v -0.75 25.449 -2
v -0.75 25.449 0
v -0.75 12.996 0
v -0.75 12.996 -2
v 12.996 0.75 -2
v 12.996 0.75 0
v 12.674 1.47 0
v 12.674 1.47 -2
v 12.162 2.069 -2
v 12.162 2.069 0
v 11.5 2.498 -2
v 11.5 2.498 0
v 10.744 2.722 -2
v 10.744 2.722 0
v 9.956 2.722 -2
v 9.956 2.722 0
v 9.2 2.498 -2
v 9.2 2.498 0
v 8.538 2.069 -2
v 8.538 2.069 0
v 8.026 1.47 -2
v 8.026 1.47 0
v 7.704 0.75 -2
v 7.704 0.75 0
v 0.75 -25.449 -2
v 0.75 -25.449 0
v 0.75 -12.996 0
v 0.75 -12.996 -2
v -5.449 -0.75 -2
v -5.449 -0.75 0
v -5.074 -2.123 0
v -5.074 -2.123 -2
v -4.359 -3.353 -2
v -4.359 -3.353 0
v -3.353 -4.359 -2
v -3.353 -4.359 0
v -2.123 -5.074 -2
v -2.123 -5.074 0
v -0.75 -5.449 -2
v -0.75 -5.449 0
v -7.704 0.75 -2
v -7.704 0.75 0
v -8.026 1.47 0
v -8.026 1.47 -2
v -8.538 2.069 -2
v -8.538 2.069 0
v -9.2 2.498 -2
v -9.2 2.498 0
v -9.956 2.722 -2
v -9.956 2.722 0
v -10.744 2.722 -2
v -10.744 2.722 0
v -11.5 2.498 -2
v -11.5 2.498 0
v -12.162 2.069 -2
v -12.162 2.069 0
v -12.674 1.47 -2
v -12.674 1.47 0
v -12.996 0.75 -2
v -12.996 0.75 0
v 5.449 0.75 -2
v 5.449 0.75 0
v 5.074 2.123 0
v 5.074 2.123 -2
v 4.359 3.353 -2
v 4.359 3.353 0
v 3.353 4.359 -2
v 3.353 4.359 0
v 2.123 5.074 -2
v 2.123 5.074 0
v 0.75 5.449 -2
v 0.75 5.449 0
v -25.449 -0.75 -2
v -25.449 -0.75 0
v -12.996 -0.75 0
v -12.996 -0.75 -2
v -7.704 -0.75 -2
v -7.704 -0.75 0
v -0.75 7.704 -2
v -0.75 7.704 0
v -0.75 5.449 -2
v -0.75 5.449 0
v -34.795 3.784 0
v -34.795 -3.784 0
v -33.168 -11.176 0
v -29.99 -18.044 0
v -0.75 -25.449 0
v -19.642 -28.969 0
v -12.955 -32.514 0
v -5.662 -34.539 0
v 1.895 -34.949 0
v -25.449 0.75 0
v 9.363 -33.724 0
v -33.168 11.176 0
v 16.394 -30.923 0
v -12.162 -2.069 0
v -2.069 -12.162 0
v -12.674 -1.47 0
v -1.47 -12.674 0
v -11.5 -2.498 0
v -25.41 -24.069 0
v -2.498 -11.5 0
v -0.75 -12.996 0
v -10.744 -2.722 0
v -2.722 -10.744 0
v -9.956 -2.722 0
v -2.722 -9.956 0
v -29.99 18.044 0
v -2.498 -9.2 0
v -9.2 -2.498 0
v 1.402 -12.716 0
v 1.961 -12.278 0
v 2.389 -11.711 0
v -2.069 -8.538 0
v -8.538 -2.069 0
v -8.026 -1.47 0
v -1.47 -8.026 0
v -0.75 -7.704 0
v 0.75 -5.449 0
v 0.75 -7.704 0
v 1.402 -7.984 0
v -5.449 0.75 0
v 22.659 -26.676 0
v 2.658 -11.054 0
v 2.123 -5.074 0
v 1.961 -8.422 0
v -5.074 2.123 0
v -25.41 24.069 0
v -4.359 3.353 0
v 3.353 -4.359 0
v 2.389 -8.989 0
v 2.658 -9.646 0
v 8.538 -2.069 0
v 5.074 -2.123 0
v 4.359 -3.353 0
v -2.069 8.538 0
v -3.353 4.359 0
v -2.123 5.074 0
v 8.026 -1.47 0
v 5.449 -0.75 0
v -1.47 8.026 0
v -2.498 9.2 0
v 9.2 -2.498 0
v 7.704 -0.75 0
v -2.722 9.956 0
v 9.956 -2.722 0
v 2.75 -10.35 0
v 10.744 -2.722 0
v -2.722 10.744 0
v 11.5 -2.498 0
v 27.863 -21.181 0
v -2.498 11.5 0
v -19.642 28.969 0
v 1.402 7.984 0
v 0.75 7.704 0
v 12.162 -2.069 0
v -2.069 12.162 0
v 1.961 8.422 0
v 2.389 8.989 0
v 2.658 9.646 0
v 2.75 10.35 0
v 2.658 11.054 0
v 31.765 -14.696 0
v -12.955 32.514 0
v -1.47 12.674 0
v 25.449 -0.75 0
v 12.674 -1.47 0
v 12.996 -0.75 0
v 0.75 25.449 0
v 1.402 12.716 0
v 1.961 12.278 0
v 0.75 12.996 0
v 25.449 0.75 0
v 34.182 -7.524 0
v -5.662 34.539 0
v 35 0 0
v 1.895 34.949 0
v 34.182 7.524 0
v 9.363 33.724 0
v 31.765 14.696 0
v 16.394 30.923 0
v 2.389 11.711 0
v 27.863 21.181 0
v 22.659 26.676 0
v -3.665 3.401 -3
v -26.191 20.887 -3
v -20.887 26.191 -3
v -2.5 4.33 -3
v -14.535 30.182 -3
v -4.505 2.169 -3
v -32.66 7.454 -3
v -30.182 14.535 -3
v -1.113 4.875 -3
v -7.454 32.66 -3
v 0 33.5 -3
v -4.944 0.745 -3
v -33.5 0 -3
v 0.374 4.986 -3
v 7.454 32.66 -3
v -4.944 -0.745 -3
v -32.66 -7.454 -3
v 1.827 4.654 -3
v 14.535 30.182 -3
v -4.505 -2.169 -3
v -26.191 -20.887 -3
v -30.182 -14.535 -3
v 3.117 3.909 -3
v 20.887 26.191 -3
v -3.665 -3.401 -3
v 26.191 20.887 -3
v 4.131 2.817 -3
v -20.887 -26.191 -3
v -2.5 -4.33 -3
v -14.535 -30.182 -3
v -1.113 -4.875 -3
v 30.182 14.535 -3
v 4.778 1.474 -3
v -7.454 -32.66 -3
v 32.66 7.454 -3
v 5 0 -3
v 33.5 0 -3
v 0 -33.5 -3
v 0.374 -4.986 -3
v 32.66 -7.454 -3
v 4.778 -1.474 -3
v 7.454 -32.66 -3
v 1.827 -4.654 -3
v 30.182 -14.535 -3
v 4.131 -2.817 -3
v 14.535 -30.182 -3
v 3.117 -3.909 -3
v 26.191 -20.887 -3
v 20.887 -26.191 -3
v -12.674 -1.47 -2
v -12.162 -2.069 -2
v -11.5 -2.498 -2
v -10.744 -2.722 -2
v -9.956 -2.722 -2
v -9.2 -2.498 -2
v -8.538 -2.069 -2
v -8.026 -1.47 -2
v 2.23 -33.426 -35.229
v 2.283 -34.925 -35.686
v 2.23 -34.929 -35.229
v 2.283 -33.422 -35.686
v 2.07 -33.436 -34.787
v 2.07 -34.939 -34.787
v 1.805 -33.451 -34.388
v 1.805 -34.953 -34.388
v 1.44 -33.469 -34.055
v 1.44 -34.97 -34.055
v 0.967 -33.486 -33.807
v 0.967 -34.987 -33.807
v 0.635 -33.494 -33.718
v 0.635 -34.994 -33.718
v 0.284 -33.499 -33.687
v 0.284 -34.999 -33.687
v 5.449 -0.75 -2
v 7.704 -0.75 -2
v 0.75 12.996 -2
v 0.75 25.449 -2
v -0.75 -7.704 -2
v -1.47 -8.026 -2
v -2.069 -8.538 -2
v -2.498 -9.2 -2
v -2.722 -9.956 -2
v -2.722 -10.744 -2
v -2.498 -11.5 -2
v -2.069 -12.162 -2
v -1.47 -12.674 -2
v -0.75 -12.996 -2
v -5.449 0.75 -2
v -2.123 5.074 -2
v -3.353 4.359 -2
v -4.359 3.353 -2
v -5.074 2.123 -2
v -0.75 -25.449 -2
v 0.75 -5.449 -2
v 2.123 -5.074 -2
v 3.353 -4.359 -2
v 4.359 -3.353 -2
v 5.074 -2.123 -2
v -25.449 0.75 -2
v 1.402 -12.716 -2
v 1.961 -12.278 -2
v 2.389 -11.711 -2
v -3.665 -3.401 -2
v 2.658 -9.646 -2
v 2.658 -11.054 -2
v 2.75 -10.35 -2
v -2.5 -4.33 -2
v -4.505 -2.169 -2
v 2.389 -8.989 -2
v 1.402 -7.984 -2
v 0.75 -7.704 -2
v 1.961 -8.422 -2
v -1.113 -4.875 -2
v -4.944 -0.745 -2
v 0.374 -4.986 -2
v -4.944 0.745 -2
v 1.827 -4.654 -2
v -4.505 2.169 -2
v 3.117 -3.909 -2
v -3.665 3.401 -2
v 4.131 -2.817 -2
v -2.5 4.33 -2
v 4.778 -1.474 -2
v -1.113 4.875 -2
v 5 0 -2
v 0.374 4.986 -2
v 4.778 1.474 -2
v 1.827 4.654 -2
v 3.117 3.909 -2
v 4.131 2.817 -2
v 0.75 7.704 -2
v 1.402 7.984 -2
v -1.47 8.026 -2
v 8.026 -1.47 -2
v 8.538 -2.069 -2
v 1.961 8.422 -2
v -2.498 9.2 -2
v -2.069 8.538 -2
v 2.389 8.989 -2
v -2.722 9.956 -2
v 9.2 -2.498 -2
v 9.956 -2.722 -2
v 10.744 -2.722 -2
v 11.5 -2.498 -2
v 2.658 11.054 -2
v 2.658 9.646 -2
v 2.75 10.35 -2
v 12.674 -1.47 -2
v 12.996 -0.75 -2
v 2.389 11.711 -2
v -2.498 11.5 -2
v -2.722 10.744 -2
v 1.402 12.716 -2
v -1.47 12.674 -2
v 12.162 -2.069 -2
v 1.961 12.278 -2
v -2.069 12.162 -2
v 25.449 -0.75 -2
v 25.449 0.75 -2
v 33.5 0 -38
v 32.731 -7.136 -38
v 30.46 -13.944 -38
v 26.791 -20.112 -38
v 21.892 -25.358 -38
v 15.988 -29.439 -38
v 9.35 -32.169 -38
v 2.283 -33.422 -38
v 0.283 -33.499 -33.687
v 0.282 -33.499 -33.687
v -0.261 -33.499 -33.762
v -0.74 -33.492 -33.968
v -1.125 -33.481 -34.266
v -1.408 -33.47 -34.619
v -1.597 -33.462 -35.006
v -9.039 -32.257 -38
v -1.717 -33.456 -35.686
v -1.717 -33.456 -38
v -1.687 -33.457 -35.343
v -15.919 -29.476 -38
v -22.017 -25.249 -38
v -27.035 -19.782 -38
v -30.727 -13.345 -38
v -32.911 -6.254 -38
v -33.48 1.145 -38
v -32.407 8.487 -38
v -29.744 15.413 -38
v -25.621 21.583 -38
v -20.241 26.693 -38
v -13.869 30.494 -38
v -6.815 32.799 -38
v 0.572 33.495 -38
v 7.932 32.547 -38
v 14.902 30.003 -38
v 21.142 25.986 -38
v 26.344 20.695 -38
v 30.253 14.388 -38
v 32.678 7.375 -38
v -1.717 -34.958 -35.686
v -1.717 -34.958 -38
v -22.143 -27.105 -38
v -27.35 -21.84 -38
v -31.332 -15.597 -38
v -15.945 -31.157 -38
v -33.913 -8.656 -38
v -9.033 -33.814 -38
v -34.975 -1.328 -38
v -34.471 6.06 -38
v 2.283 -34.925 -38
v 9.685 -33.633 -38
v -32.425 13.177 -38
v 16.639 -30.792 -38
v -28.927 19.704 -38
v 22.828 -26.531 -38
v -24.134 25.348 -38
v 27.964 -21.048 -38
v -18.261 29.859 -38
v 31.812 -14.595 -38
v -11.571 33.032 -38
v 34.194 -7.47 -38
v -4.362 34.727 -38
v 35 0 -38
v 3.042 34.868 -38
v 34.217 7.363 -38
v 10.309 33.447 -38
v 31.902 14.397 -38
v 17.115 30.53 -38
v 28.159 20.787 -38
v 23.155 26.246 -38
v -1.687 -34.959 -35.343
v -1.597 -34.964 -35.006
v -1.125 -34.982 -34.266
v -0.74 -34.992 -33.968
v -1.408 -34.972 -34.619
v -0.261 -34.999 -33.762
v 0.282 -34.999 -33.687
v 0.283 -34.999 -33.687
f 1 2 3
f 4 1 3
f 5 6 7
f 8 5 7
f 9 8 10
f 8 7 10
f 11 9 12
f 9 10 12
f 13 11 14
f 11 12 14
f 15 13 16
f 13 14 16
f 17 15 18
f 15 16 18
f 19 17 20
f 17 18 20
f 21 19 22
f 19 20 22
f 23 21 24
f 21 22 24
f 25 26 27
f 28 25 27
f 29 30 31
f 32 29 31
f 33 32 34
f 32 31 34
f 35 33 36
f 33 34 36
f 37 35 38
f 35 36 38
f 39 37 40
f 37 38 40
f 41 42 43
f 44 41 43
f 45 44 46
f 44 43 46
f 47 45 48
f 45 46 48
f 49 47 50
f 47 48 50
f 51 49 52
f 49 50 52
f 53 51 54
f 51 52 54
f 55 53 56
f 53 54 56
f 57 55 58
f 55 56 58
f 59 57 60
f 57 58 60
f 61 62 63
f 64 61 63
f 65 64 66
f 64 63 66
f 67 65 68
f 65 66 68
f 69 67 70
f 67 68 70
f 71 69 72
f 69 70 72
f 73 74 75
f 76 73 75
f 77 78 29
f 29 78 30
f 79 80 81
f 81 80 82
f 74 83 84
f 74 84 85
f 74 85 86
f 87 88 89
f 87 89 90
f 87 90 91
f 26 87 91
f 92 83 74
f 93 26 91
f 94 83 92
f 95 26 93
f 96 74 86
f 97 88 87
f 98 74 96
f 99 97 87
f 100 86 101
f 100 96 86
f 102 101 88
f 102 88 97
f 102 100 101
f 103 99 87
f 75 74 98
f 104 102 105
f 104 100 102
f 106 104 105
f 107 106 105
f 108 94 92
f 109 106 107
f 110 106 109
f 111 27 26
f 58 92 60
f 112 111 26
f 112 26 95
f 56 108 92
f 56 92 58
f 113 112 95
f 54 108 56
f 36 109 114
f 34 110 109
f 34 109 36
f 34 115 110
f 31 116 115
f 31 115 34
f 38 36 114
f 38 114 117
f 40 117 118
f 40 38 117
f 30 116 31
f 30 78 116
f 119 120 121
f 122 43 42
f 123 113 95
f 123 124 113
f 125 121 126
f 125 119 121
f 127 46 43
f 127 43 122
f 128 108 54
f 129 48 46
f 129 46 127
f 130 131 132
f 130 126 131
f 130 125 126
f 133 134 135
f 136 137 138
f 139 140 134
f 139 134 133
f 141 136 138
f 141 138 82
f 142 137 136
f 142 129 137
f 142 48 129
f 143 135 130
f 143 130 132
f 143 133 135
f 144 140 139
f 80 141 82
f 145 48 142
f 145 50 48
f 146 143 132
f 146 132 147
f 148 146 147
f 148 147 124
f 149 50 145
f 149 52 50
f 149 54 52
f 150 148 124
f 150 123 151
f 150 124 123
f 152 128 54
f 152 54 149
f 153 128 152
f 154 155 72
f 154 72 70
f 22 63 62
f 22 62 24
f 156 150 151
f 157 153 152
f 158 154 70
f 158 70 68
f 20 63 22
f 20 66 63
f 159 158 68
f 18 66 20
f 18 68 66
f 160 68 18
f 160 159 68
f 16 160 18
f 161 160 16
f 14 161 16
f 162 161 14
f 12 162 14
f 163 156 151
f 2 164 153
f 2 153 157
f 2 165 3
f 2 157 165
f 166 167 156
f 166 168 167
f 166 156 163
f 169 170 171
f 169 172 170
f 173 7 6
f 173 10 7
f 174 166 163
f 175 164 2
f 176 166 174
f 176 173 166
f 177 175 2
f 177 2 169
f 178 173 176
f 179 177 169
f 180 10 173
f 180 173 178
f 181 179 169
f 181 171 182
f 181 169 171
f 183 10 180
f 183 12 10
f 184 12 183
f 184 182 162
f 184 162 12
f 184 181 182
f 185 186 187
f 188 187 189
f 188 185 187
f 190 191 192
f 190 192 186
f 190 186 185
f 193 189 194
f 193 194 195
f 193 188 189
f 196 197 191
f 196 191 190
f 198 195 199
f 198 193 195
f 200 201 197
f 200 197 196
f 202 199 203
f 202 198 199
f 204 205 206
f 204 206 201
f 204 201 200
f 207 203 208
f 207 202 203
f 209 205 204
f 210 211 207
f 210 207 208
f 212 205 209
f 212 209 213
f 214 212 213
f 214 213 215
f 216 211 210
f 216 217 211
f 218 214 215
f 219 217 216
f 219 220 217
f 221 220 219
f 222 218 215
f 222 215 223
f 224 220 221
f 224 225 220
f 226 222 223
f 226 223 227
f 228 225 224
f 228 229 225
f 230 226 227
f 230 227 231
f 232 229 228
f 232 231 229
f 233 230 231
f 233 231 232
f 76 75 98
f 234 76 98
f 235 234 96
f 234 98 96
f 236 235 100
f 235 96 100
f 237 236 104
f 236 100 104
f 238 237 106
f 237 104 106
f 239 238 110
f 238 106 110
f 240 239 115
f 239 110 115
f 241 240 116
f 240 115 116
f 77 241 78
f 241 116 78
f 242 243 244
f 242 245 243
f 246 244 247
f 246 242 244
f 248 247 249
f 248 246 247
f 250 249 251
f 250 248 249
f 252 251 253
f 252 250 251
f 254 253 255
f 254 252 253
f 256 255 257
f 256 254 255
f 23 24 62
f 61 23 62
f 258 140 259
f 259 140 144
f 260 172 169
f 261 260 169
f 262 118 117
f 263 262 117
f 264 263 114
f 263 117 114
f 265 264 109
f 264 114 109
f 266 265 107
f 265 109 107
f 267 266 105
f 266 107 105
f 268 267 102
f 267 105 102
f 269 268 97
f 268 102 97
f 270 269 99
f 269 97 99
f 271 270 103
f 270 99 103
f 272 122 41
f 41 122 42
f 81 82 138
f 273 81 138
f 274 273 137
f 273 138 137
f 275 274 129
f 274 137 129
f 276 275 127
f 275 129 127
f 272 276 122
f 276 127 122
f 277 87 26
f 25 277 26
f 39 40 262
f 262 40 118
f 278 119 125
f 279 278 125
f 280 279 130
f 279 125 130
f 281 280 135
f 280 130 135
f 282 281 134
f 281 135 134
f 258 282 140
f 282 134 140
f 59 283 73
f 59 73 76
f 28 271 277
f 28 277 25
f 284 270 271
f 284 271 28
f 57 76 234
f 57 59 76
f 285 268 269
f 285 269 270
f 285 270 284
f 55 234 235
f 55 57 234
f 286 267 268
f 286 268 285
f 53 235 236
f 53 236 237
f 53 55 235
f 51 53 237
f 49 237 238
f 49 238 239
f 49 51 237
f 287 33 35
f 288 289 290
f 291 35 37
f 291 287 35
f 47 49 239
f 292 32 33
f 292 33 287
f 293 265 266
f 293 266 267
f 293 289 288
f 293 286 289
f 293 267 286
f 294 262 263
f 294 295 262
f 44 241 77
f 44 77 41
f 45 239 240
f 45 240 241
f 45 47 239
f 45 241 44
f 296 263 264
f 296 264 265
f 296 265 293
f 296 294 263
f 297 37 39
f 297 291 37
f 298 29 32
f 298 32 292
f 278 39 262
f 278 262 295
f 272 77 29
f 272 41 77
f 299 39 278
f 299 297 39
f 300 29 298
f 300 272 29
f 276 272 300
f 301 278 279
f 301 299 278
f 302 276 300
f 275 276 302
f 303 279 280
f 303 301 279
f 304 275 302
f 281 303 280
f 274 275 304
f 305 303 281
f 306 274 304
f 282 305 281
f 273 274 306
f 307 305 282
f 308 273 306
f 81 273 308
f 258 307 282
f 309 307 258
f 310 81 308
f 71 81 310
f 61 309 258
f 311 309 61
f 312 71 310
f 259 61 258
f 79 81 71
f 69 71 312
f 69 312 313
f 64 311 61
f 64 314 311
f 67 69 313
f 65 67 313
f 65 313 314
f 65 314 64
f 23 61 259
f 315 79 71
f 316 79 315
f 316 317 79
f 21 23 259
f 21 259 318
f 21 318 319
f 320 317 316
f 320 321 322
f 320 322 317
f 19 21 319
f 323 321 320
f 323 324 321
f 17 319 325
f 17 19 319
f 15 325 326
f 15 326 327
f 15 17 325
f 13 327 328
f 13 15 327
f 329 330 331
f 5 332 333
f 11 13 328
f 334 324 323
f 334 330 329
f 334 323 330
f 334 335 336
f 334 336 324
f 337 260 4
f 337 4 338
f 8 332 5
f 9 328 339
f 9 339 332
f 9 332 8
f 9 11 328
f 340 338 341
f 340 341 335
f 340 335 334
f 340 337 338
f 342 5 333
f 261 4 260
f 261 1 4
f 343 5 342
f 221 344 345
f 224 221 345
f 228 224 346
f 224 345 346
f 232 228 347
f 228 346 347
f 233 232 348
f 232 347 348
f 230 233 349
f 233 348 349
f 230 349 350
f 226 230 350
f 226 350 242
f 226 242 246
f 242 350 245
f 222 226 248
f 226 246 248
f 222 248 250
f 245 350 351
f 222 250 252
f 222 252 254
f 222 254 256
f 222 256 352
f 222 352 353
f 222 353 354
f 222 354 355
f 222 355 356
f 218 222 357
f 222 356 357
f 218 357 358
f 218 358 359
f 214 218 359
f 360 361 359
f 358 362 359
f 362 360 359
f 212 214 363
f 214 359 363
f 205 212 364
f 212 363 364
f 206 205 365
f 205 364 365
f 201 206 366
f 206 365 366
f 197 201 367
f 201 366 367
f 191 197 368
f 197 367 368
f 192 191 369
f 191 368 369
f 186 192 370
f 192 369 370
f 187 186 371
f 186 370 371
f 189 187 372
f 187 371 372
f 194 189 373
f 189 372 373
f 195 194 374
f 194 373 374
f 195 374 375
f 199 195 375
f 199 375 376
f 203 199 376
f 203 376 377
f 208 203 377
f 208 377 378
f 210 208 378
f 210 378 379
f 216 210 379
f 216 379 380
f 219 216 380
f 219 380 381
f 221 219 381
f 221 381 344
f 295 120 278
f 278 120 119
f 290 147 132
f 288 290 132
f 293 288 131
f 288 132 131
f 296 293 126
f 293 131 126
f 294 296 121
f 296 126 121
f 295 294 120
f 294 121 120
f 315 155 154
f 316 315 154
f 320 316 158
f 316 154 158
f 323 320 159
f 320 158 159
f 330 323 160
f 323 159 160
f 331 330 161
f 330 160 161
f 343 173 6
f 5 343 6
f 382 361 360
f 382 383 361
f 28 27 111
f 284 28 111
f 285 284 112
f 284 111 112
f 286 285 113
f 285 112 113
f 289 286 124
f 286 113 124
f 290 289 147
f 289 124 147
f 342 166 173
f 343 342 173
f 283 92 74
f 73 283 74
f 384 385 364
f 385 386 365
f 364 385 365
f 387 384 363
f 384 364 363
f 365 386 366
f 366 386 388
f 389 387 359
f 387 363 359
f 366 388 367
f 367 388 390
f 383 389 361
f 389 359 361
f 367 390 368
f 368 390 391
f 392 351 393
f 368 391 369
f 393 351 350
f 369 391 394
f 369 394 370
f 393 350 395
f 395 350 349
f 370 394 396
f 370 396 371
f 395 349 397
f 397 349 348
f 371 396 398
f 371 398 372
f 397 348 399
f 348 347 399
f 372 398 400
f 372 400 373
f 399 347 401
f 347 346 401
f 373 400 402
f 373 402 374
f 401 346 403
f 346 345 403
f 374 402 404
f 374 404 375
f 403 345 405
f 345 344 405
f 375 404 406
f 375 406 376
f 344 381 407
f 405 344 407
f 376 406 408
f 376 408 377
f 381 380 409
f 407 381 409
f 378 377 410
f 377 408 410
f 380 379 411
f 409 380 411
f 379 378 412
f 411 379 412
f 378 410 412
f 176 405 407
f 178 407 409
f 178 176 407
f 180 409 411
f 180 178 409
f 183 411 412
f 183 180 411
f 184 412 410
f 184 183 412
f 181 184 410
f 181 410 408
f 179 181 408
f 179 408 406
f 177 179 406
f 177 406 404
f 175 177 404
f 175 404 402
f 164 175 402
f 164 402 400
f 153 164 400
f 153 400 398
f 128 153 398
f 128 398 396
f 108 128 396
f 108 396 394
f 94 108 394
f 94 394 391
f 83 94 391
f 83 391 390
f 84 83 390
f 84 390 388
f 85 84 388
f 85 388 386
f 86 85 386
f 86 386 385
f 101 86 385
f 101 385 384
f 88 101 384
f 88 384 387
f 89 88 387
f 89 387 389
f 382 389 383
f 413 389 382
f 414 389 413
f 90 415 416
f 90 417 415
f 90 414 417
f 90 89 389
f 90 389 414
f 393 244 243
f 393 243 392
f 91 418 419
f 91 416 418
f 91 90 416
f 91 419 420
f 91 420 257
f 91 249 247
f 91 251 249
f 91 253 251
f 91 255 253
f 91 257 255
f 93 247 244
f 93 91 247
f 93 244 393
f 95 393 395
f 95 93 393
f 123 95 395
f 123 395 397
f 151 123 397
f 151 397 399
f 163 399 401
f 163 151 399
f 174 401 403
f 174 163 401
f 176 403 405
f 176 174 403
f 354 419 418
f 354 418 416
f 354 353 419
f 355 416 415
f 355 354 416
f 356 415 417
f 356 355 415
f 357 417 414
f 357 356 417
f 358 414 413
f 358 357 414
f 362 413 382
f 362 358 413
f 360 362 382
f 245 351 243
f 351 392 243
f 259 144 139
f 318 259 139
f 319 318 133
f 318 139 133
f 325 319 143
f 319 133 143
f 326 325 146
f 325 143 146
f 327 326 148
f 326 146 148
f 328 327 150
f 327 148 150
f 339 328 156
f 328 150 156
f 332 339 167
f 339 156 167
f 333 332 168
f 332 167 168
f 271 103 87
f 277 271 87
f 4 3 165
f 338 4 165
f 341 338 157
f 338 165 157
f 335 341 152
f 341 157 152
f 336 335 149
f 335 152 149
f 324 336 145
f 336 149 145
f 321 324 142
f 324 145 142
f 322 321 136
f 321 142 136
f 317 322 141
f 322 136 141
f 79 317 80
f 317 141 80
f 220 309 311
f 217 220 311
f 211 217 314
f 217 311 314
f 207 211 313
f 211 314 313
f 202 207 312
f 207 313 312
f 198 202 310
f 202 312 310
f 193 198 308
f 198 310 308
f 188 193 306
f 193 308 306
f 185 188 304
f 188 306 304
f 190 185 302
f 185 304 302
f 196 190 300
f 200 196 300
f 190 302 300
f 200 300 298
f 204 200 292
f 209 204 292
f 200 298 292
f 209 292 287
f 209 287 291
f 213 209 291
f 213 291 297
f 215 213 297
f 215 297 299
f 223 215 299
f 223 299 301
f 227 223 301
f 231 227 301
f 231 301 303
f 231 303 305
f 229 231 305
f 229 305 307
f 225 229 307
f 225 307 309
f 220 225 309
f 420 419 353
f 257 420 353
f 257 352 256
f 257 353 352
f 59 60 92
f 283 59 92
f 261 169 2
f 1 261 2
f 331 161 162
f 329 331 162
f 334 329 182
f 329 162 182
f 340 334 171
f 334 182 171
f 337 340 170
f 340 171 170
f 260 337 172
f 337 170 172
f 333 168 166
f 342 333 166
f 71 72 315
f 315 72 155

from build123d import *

# Parameters (mm, degrees)
F0_R     = 35
F0_R_2   = 5
F1_DEPTH = 38
F2_DEPTH = 2
F3_R     = 33.5
F4_DEPTH = 35
F5_DEPTH = 38.001
F7_W     = 4
F7_H     = 4.5
F8_DEPTH = 2
F9_R     = 1.999


# Not quite as in the source:
# - a fillet or chamfer is up to 0.001 mm smaller than in the source, because OpenCascade refuses the exact size


with BuildPart() as f1:
    # F0 (on Top) → F1 (new body)
    with BuildSketch(Plane.XY):
        Circle(F0_R)
        with BuildLine():
            ThreePointArc((0.75, 5.4486236794), (3.8890872965, 3.8890872965), (5.4486236794, 0.75))
            Line((5.4486236794, 0.75), (7.7042486889, 0.75))
            ThreePointArc((7.7042486889, 0.75), (10.35, 2.75), (12.9957513111, 0.75))
            Line((12.9957513111, 0.75), (25.4486236794, 0.75))
            Line((25.4486236794, 0.75), (25.4486236794, -0.75))
            Line((25.4486236794, -0.75), (12.9957513111, -0.75))
            ThreePointArc((12.9957513111, -0.75), (10.35, -2.75), (7.7042486889, -0.75))
            Line((7.7042486889, -0.75), (5.4486236794, -0.75))
            ThreePointArc((5.4486236794, -0.75), (3.8890872965, -3.8890872965), (0.75, -5.4486236794))
            Line((0.75, -5.4486236794), (0.75, -7.7042486889))
            ThreePointArc((0.75, -7.7042486889), (2.1937410968, -8.6916876048), (2.75, -10.35))
            ThreePointArc((2.75, -10.35), (2.1937410968, -12.0083123952), (0.75, -12.9957513111))
            Line((0.75, -12.9957513111), (0.75, -25.4486236794))
            Line((0.75, -25.4486236794), (-0.75, -25.4486236794))
            Line((-0.75, -25.4486236794), (-0.75, -12.9957513111))
            ThreePointArc((-0.75, -12.9957513111), (-2.75, -10.35), (-0.75, -7.7042486889))
            Line((-0.75, -7.7042486889), (-0.75, -5.4486236794))
            ThreePointArc((-0.75, -5.4486236794), (-3.8890872965, -3.8890872965), (-5.4486236794, -0.75))
            Line((-5.4486236794, -0.75), (-7.7042486889, -0.75))
            ThreePointArc((-7.7042486889, -0.75), (-10.35, -2.75), (-12.9957513111, -0.75))
            Line((-12.9957513111, -0.75), (-25.4486236794, -0.75))
            Line((-25.4486236794, -0.75), (-25.4486236794, 0.75))
            Line((-25.4486236794, 0.75), (-12.9957513111, 0.75))
            ThreePointArc((-12.9957513111, 0.75), (-10.35, 2.75), (-7.7042486889, 0.75))
            Line((-7.7042486889, 0.75), (-5.4486236794, 0.75))
            ThreePointArc((-5.4486236794, 0.75), (-3.8890872965, 3.8890872965), (-0.75, 5.4486236794))
            Line((-0.75, 5.4486236794), (-0.75, 7.7042486889))
            ThreePointArc((-0.75, 7.7042486889), (-2.75, 10.35), (-0.75, 12.9957513111))
            Line((-0.75, 12.9957513111), (-0.75, 25.4486236794))
            Line((-0.75, 25.4486236794), (0.75, 25.4486236794))
            Line((0.75, 25.4486236794), (0.75, 12.9957513111))
            ThreePointArc((0.75, 12.9957513111), (2.1937410968, 12.0083123952), (2.75, 10.35))
            ThreePointArc((2.75, 10.35), (2.1937410968, 8.6916876048), (0.75, 7.7042486889))
            Line((0.75, 7.7042486889), (0.75, 5.4486236794))
        make_face(mode=Mode.SUBTRACT)
        with BuildLine():
            Line((0.75, -12.9957513111), (0.75, -7.7042486889))
            ThreePointArc((0.75, -7.7042486889), (0, -7.6), (-0.75, -7.7042486889))
            Line((-0.75, -7.7042486889), (-0.75, -12.9957513111))
            ThreePointArc((-0.75, -12.9957513111), (0, -13.1), (0.75, -12.9957513111))
        make_face()
        with BuildLine():
            Line((12.9957513111, 0.75), (7.7042486889, 0.75))
            ThreePointArc((7.7042486889, 0.75), (7.6, 0), (7.7042486889, -0.75))
            Line((7.7042486889, -0.75), (12.9957513111, -0.75))
            ThreePointArc((12.9957513111, -0.75), (13.0738131457, -0.3786052658), (13.1, 0))
            ThreePointArc((13.1, 0), (13.0738131457, 0.3786052658), (12.9957513111, 0.75))
        make_face()
        with BuildLine():
            ThreePointArc((-5.4486236794, -0.75), (-5.5, 0), (-5.4486236794, 0.75))
            Line((-5.4486236794, 0.75), (-7.7042486889, 0.75))
            ThreePointArc((-7.7042486889, 0.75), (-7.6261868543, 0.3786052658), (-7.6, 0))
            ThreePointArc((-7.6, 0), (-7.6261868543, -0.3786052658), (-7.7042486889, -0.75))
            Line((-7.7042486889, -0.75), (-5.4486236794, -0.75))
        make_face()
        with BuildLine():
            Line((-12.9957513111, 0.75), (-7.7042486889, 0.75))
            ThreePointArc((-7.7042486889, 0.75), (-10.35, 2.75), (-12.9957513111, 0.75))
        make_face()
        with BuildLine():
            ThreePointArc((-0.75, 12.9957513111), (0, 13.1), (0.75, 12.9957513111))
            Line((0.75, 12.9957513111), (0.75, 25.4486236794))
            Line((0.75, 25.4486236794), (-0.75, 25.4486236794))
            Line((-0.75, 25.4486236794), (-0.75, 12.9957513111))
        make_face()
        with BuildLine():
            ThreePointArc((-12.9957513111, -0.75), (-10.35, -2.75), (-7.7042486889, -0.75))
            Line((-7.7042486889, -0.75), (-12.9957513111, -0.75))
        make_face()
        with BuildLine():
            ThreePointArc((-12.9957513111, -0.75), (-13.1, 0), (-12.9957513111, 0.75))
            Line((-12.9957513111, 0.75), (-25.4486236794, 0.75))
            Line((-25.4486236794, 0.75), (-25.4486236794, -0.75))
            Line((-25.4486236794, -0.75), (-12.9957513111, -0.75))
        make_face()
        with BuildLine():
            Line((-0.75, -12.9957513111), (-0.75, -7.7042486889))
            ThreePointArc((-0.75, -7.7042486889), (-2.75, -10.35), (-0.75, -12.9957513111))
        make_face()
        with BuildLine():
            Line((0.75, -25.4486236794), (0.75, -12.9957513111))
            ThreePointArc((0.75, -12.9957513111), (0, -13.1), (-0.75, -12.9957513111))
            Line((-0.75, -12.9957513111), (-0.75, -25.4486236794))
            Line((-0.75, -25.4486236794), (0.75, -25.4486236794))
        make_face()
        with BuildLine():
            ThreePointArc((2.75, -10.35), (2.1937410968, -8.6916876048), (0.75, -7.7042486889))
            Line((0.75, -7.7042486889), (0.75, -12.9957513111))
            ThreePointArc((0.75, -12.9957513111), (2.1937410968, -12.0083123952), (2.75, -10.35))
        make_face()
        with BuildLine():
            Line((12.9957513111, -0.75), (7.7042486889, -0.75))
            ThreePointArc((7.7042486889, -0.75), (10.35, -2.75), (12.9957513111, -0.75))
        make_face()
        with BuildLine():
            Line((25.4486236794, 0.75), (12.9957513111, 0.75))
            ThreePointArc((12.9957513111, 0.75), (13.0738131457, 0.3786052658), (13.1, 0))
            ThreePointArc((13.1, 0), (13.0738131457, -0.3786052658), (12.9957513111, -0.75))
            Line((12.9957513111, -0.75), (25.4486236794, -0.75))
            Line((25.4486236794, -0.75), (25.4486236794, 0.75))
        make_face()
        with BuildLine():
            ThreePointArc((5.4486236794, -0.75), (5.4871408874, -0.3758788124), (5.5, 0))
            ThreePointArc((5.5, 0), (5.4871408874, 0.3758788124), (5.4486236794, 0.75))
            ThreePointArc((5.4486236794, 0.75), (3.8890872965, 3.8890872965), (0.75, 5.4486236794))
            ThreePointArc((0.75, 5.4486236794), (0, 5.5), (-0.75, 5.4486236794))
            ThreePointArc((-0.75, 5.4486236794), (-3.8890872965, 3.8890872965), (-5.4486236794, 0.75))
            ThreePointArc((-5.4486236794, 0.75), (-5.5, 0), (-5.4486236794, -0.75))
            ThreePointArc((-5.4486236794, -0.75), (-3.8890872965, -3.8890872965), (-0.75, -5.4486236794))
            ThreePointArc((-0.75, -5.4486236794), (0, -5.5), (0.75, -5.4486236794))
            ThreePointArc((0.75, -5.4486236794), (3.8890872965, -3.8890872965), (5.4486236794, -0.75))
        make_face()
        Circle(F0_R_2, mode=Mode.SUBTRACT)
        with BuildLine():
            ThreePointArc((12.9957513111, 0.75), (10.35, 2.75), (7.7042486889, 0.75))
            Line((7.7042486889, 0.75), (12.9957513111, 0.75))
        make_face()
        with BuildLine():
            ThreePointArc((-0.75, 7.7042486889), (0, 7.6), (0.75, 7.7042486889))
            Line((0.75, 7.7042486889), (0.75, 12.9957513111))
            ThreePointArc((0.75, 12.9957513111), (0, 13.1), (-0.75, 12.9957513111))
            Line((-0.75, 12.9957513111), (-0.75, 7.7042486889))
        make_face()
        with BuildLine():
            ThreePointArc((5.4486236794, 0.75), (5.4871408874, 0.3758788124), (5.5, 0))
            ThreePointArc((5.5, 0), (5.4871408874, -0.3758788124), (5.4486236794, -0.75))
            Line((5.4486236794, -0.75), (7.7042486889, -0.75))
            ThreePointArc((7.7042486889, -0.75), (7.6, 0), (7.7042486889, 0.75))
            Line((7.7042486889, 0.75), (5.4486236794, 0.75))
        make_face()
        with BuildLine():
            Line((0.75, -7.7042486889), (0.75, -5.4486236794))
            ThreePointArc((0.75, -5.4486236794), (0, -5.5), (-0.75, -5.4486236794))
            Line((-0.75, -5.4486236794), (-0.75, -7.7042486889))
            ThreePointArc((-0.75, -7.7042486889), (0, -7.6), (0.75, -7.7042486889))
        make_face()
        with BuildLine():
            ThreePointArc((-0.75, 5.4486236794), (0, 5.5), (0.75, 5.4486236794))
            Line((0.75, 5.4486236794), (0.75, 7.7042486889))
            ThreePointArc((0.75, 7.7042486889), (0, 7.6), (-0.75, 7.7042486889))
            Line((-0.75, 7.7042486889), (-0.75, 5.4486236794))
        make_face()
        Circle(F0_R_2)
        with BuildLine():
            ThreePointArc((-0.75, 12.9957513111), (-2.75, 10.35), (-0.75, 7.7042486889))
            Line((-0.75, 7.7042486889), (-0.75, 12.9957513111))
        make_face()
        with BuildLine():
            Line((0.75, 12.9957513111), (0.75, 7.7042486889))
            ThreePointArc((0.75, 7.7042486889), (2.1937410968, 8.6916876048), (2.75, 10.35))
            ThreePointArc((2.75, 10.35), (2.1937410968, 12.0083123952), (0.75, 12.9957513111))
        make_face()
        with BuildLine():
            ThreePointArc((-7.6, 0), (-7.6261868543, 0.3786052658), (-7.7042486889, 0.75))
            Line((-7.7042486889, 0.75), (-12.9957513111, 0.75))
            ThreePointArc((-12.9957513111, 0.75), (-13.1, 0), (-12.9957513111, -0.75))
            Line((-12.9957513111, -0.75), (-7.7042486889, -0.75))
            ThreePointArc((-7.7042486889, -0.75), (-7.6261868543, -0.3786052658), (-7.6, 0))
        make_face()
    extrude(amount=-F1_DEPTH)

    # F0 (on Top) → F2 (cut)
    with BuildSketch(Plane.XY):
        with BuildLine():
            ThreePointArc((-12.9957513111, -0.75), (-10.35, -2.75), (-7.7042486889, -0.75))
            Line((-7.7042486889, -0.75), (-12.9957513111, -0.75))
        make_face()
        with BuildLine():
            Line((-12.9957513111, 0.75), (-7.7042486889, 0.75))
            ThreePointArc((-7.7042486889, 0.75), (-10.35, 2.75), (-12.9957513111, 0.75))
        make_face()
        with BuildLine():
            ThreePointArc((-7.6, 0), (-7.6261868543, 0.3786052658), (-7.7042486889, 0.75))
            Line((-7.7042486889, 0.75), (-12.9957513111, 0.75))
            ThreePointArc((-12.9957513111, 0.75), (-13.1, 0), (-12.9957513111, -0.75))
            Line((-12.9957513111, -0.75), (-7.7042486889, -0.75))
            ThreePointArc((-7.7042486889, -0.75), (-7.6261868543, -0.3786052658), (-7.6, 0))
        make_face()
        with BuildLine():
            ThreePointArc((-12.9957513111, -0.75), (-13.1, 0), (-12.9957513111, 0.75))
            Line((-12.9957513111, 0.75), (-25.4486236794, 0.75))
            Line((-25.4486236794, 0.75), (-25.4486236794, -0.75))
            Line((-25.4486236794, -0.75), (-12.9957513111, -0.75))
        make_face()
        with BuildLine():
            ThreePointArc((-5.4486236794, -0.75), (-5.5, 0), (-5.4486236794, 0.75))
            Line((-5.4486236794, 0.75), (-7.7042486889, 0.75))
            ThreePointArc((-7.7042486889, 0.75), (-7.6261868543, 0.3786052658), (-7.6, 0))
            ThreePointArc((-7.6, 0), (-7.6261868543, -0.3786052658), (-7.7042486889, -0.75))
            Line((-7.7042486889, -0.75), (-5.4486236794, -0.75))
        make_face()
        with BuildLine():
            ThreePointArc((5.4486236794, -0.75), (5.4871408874, -0.3758788124), (5.5, 0))
            ThreePointArc((5.5, 0), (5.4871408874, 0.3758788124), (5.4486236794, 0.75))
            ThreePointArc((5.4486236794, 0.75), (3.8890872965, 3.8890872965), (0.75, 5.4486236794))
            ThreePointArc((0.75, 5.4486236794), (0, 5.5), (-0.75, 5.4486236794))
            ThreePointArc((-0.75, 5.4486236794), (-3.8890872965, 3.8890872965), (-5.4486236794, 0.75))
            ThreePointArc((-5.4486236794, 0.75), (-5.5, 0), (-5.4486236794, -0.75))
            ThreePointArc((-5.4486236794, -0.75), (-3.8890872965, -3.8890872965), (-0.75, -5.4486236794))
            ThreePointArc((-0.75, -5.4486236794), (0, -5.5), (0.75, -5.4486236794))
            ThreePointArc((0.75, -5.4486236794), (3.8890872965, -3.8890872965), (5.4486236794, -0.75))
        make_face()
        Circle(F0_R_2, mode=Mode.SUBTRACT)
        with BuildLine():
            Line((0.75, 12.9957513111), (0.75, 7.7042486889))
            ThreePointArc((0.75, 7.7042486889), (2.1937410968, 8.6916876048), (2.75, 10.35))
            ThreePointArc((2.75, 10.35), (2.1937410968, 12.0083123952), (0.75, 12.9957513111))
        make_face()
        with BuildLine():
            ThreePointArc((-0.75, 12.9957513111), (-2.75, 10.35), (-0.75, 7.7042486889))
            Line((-0.75, 7.7042486889), (-0.75, 12.9957513111))
        make_face()
        with BuildLine():
            ThreePointArc((-0.75, 7.7042486889), (0, 7.6), (0.75, 7.7042486889))
            Line((0.75, 7.7042486889), (0.75, 12.9957513111))
            ThreePointArc((0.75, 12.9957513111), (0, 13.1), (-0.75, 12.9957513111))
            Line((-0.75, 12.9957513111), (-0.75, 7.7042486889))
        make_face()
        with BuildLine():
            ThreePointArc((-0.75, 5.4486236794), (0, 5.5), (0.75, 5.4486236794))
            Line((0.75, 5.4486236794), (0.75, 7.7042486889))
            ThreePointArc((0.75, 7.7042486889), (0, 7.6), (-0.75, 7.7042486889))
            Line((-0.75, 7.7042486889), (-0.75, 5.4486236794))
        make_face()
        with BuildLine():
            ThreePointArc((-0.75, 12.9957513111), (0, 13.1), (0.75, 12.9957513111))
            Line((0.75, 12.9957513111), (0.75, 25.4486236794))
            Line((0.75, 25.4486236794), (-0.75, 25.4486236794))
            Line((-0.75, 25.4486236794), (-0.75, 12.9957513111))
        make_face()
        with BuildLine():
            Line((12.9957513111, 0.75), (7.7042486889, 0.75))
            ThreePointArc((7.7042486889, 0.75), (7.6, 0), (7.7042486889, -0.75))
            Line((7.7042486889, -0.75), (12.9957513111, -0.75))
            ThreePointArc((12.9957513111, -0.75), (13.0738131457, -0.3786052658), (13.1, 0))
            ThreePointArc((13.1, 0), (13.0738131457, 0.3786052658), (12.9957513111, 0.75))
        make_face()
        with BuildLine():
            ThreePointArc((12.9957513111, 0.75), (10.35, 2.75), (7.7042486889, 0.75))
            Line((7.7042486889, 0.75), (12.9957513111, 0.75))
        make_face()
        with BuildLine():
            Line((12.9957513111, -0.75), (7.7042486889, -0.75))
            ThreePointArc((7.7042486889, -0.75), (10.35, -2.75), (12.9957513111, -0.75))
        make_face()
        with BuildLine():
            ThreePointArc((5.4486236794, 0.75), (5.4871408874, 0.3758788124), (5.5, 0))
            ThreePointArc((5.5, 0), (5.4871408874, -0.3758788124), (5.4486236794, -0.75))
            Line((5.4486236794, -0.75), (7.7042486889, -0.75))
            ThreePointArc((7.7042486889, -0.75), (7.6, 0), (7.7042486889, 0.75))
            Line((7.7042486889, 0.75), (5.4486236794, 0.75))
        make_face()
        with BuildLine():
            Line((25.4486236794, 0.75), (12.9957513111, 0.75))
            ThreePointArc((12.9957513111, 0.75), (13.0738131457, 0.3786052658), (13.1, 0))
            ThreePointArc((13.1, 0), (13.0738131457, -0.3786052658), (12.9957513111, -0.75))
            Line((12.9957513111, -0.75), (25.4486236794, -0.75))
            Line((25.4486236794, -0.75), (25.4486236794, 0.75))
        make_face()
        with BuildLine():
            Line((0.75, -25.4486236794), (0.75, -12.9957513111))
            ThreePointArc((0.75, -12.9957513111), (0, -13.1), (-0.75, -12.9957513111))
            Line((-0.75, -12.9957513111), (-0.75, -25.4486236794))
            Line((-0.75, -25.4486236794), (0.75, -25.4486236794))
        make_face()
        with BuildLine():
            Line((0.75, -12.9957513111), (0.75, -7.7042486889))
            ThreePointArc((0.75, -7.7042486889), (0, -7.6), (-0.75, -7.7042486889))
            Line((-0.75, -7.7042486889), (-0.75, -12.9957513111))
            ThreePointArc((-0.75, -12.9957513111), (0, -13.1), (0.75, -12.9957513111))
        make_face()
        with BuildLine():
            Line((-0.75, -12.9957513111), (-0.75, -7.7042486889))
            ThreePointArc((-0.75, -7.7042486889), (-2.75, -10.35), (-0.75, -12.9957513111))
        make_face()
        with BuildLine():
            ThreePointArc((2.75, -10.35), (2.1937410968, -8.6916876048), (0.75, -7.7042486889))
            Line((0.75, -7.7042486889), (0.75, -12.9957513111))
            ThreePointArc((0.75, -12.9957513111), (2.1937410968, -12.0083123952), (2.75, -10.35))
        make_face()
        with BuildLine():
            Line((0.75, -7.7042486889), (0.75, -5.4486236794))
            ThreePointArc((0.75, -5.4486236794), (0, -5.5), (-0.75, -5.4486236794))
            Line((-0.75, -5.4486236794), (-0.75, -7.7042486889))
            ThreePointArc((-0.75, -7.7042486889), (0, -7.6), (0.75, -7.7042486889))
        make_face()
    extrude(amount=-F2_DEPTH, mode=Mode.SUBTRACT)

    # F3 (on face) → F4 (cut)
    with BuildSketch(Plane(origin=(0, 0, -38), x_dir=(1, 0, 0), z_dir=(0, 0, -1))):
        Circle(F3_R)
    extrude(amount=-F4_DEPTH, mode=Mode.SUBTRACT)

    # F0 (on Top) → F5 (cut, through all)
    with BuildSketch(Plane.XY):
        Circle(F0_R_2)
    extrude(amount=-F5_DEPTH, mode=Mode.SUBTRACT)

    # F7 (on offset) → F8 (cut)
    with BuildSketch(Plane.XZ.offset(35)):
        with Locations((0.2834053928, -35.936942324)):
            Rectangle(F7_W, F7_H)
    extrude(amount=-F8_DEPTH, mode=Mode.SUBTRACT)

    # F9 (radius 2 in the source; OpenCascade refuses exactly that, so slightly less here)
    f9_edges = [f1.edges().sort_by_distance(p)[0] for p in [
        (2.283405, -34.173763, -33.686942),
        (-1.716595, -34.206935, -33.686942),
    ]]
    fillet(f9_edges, radius=F9_R)


solid = f1.part
